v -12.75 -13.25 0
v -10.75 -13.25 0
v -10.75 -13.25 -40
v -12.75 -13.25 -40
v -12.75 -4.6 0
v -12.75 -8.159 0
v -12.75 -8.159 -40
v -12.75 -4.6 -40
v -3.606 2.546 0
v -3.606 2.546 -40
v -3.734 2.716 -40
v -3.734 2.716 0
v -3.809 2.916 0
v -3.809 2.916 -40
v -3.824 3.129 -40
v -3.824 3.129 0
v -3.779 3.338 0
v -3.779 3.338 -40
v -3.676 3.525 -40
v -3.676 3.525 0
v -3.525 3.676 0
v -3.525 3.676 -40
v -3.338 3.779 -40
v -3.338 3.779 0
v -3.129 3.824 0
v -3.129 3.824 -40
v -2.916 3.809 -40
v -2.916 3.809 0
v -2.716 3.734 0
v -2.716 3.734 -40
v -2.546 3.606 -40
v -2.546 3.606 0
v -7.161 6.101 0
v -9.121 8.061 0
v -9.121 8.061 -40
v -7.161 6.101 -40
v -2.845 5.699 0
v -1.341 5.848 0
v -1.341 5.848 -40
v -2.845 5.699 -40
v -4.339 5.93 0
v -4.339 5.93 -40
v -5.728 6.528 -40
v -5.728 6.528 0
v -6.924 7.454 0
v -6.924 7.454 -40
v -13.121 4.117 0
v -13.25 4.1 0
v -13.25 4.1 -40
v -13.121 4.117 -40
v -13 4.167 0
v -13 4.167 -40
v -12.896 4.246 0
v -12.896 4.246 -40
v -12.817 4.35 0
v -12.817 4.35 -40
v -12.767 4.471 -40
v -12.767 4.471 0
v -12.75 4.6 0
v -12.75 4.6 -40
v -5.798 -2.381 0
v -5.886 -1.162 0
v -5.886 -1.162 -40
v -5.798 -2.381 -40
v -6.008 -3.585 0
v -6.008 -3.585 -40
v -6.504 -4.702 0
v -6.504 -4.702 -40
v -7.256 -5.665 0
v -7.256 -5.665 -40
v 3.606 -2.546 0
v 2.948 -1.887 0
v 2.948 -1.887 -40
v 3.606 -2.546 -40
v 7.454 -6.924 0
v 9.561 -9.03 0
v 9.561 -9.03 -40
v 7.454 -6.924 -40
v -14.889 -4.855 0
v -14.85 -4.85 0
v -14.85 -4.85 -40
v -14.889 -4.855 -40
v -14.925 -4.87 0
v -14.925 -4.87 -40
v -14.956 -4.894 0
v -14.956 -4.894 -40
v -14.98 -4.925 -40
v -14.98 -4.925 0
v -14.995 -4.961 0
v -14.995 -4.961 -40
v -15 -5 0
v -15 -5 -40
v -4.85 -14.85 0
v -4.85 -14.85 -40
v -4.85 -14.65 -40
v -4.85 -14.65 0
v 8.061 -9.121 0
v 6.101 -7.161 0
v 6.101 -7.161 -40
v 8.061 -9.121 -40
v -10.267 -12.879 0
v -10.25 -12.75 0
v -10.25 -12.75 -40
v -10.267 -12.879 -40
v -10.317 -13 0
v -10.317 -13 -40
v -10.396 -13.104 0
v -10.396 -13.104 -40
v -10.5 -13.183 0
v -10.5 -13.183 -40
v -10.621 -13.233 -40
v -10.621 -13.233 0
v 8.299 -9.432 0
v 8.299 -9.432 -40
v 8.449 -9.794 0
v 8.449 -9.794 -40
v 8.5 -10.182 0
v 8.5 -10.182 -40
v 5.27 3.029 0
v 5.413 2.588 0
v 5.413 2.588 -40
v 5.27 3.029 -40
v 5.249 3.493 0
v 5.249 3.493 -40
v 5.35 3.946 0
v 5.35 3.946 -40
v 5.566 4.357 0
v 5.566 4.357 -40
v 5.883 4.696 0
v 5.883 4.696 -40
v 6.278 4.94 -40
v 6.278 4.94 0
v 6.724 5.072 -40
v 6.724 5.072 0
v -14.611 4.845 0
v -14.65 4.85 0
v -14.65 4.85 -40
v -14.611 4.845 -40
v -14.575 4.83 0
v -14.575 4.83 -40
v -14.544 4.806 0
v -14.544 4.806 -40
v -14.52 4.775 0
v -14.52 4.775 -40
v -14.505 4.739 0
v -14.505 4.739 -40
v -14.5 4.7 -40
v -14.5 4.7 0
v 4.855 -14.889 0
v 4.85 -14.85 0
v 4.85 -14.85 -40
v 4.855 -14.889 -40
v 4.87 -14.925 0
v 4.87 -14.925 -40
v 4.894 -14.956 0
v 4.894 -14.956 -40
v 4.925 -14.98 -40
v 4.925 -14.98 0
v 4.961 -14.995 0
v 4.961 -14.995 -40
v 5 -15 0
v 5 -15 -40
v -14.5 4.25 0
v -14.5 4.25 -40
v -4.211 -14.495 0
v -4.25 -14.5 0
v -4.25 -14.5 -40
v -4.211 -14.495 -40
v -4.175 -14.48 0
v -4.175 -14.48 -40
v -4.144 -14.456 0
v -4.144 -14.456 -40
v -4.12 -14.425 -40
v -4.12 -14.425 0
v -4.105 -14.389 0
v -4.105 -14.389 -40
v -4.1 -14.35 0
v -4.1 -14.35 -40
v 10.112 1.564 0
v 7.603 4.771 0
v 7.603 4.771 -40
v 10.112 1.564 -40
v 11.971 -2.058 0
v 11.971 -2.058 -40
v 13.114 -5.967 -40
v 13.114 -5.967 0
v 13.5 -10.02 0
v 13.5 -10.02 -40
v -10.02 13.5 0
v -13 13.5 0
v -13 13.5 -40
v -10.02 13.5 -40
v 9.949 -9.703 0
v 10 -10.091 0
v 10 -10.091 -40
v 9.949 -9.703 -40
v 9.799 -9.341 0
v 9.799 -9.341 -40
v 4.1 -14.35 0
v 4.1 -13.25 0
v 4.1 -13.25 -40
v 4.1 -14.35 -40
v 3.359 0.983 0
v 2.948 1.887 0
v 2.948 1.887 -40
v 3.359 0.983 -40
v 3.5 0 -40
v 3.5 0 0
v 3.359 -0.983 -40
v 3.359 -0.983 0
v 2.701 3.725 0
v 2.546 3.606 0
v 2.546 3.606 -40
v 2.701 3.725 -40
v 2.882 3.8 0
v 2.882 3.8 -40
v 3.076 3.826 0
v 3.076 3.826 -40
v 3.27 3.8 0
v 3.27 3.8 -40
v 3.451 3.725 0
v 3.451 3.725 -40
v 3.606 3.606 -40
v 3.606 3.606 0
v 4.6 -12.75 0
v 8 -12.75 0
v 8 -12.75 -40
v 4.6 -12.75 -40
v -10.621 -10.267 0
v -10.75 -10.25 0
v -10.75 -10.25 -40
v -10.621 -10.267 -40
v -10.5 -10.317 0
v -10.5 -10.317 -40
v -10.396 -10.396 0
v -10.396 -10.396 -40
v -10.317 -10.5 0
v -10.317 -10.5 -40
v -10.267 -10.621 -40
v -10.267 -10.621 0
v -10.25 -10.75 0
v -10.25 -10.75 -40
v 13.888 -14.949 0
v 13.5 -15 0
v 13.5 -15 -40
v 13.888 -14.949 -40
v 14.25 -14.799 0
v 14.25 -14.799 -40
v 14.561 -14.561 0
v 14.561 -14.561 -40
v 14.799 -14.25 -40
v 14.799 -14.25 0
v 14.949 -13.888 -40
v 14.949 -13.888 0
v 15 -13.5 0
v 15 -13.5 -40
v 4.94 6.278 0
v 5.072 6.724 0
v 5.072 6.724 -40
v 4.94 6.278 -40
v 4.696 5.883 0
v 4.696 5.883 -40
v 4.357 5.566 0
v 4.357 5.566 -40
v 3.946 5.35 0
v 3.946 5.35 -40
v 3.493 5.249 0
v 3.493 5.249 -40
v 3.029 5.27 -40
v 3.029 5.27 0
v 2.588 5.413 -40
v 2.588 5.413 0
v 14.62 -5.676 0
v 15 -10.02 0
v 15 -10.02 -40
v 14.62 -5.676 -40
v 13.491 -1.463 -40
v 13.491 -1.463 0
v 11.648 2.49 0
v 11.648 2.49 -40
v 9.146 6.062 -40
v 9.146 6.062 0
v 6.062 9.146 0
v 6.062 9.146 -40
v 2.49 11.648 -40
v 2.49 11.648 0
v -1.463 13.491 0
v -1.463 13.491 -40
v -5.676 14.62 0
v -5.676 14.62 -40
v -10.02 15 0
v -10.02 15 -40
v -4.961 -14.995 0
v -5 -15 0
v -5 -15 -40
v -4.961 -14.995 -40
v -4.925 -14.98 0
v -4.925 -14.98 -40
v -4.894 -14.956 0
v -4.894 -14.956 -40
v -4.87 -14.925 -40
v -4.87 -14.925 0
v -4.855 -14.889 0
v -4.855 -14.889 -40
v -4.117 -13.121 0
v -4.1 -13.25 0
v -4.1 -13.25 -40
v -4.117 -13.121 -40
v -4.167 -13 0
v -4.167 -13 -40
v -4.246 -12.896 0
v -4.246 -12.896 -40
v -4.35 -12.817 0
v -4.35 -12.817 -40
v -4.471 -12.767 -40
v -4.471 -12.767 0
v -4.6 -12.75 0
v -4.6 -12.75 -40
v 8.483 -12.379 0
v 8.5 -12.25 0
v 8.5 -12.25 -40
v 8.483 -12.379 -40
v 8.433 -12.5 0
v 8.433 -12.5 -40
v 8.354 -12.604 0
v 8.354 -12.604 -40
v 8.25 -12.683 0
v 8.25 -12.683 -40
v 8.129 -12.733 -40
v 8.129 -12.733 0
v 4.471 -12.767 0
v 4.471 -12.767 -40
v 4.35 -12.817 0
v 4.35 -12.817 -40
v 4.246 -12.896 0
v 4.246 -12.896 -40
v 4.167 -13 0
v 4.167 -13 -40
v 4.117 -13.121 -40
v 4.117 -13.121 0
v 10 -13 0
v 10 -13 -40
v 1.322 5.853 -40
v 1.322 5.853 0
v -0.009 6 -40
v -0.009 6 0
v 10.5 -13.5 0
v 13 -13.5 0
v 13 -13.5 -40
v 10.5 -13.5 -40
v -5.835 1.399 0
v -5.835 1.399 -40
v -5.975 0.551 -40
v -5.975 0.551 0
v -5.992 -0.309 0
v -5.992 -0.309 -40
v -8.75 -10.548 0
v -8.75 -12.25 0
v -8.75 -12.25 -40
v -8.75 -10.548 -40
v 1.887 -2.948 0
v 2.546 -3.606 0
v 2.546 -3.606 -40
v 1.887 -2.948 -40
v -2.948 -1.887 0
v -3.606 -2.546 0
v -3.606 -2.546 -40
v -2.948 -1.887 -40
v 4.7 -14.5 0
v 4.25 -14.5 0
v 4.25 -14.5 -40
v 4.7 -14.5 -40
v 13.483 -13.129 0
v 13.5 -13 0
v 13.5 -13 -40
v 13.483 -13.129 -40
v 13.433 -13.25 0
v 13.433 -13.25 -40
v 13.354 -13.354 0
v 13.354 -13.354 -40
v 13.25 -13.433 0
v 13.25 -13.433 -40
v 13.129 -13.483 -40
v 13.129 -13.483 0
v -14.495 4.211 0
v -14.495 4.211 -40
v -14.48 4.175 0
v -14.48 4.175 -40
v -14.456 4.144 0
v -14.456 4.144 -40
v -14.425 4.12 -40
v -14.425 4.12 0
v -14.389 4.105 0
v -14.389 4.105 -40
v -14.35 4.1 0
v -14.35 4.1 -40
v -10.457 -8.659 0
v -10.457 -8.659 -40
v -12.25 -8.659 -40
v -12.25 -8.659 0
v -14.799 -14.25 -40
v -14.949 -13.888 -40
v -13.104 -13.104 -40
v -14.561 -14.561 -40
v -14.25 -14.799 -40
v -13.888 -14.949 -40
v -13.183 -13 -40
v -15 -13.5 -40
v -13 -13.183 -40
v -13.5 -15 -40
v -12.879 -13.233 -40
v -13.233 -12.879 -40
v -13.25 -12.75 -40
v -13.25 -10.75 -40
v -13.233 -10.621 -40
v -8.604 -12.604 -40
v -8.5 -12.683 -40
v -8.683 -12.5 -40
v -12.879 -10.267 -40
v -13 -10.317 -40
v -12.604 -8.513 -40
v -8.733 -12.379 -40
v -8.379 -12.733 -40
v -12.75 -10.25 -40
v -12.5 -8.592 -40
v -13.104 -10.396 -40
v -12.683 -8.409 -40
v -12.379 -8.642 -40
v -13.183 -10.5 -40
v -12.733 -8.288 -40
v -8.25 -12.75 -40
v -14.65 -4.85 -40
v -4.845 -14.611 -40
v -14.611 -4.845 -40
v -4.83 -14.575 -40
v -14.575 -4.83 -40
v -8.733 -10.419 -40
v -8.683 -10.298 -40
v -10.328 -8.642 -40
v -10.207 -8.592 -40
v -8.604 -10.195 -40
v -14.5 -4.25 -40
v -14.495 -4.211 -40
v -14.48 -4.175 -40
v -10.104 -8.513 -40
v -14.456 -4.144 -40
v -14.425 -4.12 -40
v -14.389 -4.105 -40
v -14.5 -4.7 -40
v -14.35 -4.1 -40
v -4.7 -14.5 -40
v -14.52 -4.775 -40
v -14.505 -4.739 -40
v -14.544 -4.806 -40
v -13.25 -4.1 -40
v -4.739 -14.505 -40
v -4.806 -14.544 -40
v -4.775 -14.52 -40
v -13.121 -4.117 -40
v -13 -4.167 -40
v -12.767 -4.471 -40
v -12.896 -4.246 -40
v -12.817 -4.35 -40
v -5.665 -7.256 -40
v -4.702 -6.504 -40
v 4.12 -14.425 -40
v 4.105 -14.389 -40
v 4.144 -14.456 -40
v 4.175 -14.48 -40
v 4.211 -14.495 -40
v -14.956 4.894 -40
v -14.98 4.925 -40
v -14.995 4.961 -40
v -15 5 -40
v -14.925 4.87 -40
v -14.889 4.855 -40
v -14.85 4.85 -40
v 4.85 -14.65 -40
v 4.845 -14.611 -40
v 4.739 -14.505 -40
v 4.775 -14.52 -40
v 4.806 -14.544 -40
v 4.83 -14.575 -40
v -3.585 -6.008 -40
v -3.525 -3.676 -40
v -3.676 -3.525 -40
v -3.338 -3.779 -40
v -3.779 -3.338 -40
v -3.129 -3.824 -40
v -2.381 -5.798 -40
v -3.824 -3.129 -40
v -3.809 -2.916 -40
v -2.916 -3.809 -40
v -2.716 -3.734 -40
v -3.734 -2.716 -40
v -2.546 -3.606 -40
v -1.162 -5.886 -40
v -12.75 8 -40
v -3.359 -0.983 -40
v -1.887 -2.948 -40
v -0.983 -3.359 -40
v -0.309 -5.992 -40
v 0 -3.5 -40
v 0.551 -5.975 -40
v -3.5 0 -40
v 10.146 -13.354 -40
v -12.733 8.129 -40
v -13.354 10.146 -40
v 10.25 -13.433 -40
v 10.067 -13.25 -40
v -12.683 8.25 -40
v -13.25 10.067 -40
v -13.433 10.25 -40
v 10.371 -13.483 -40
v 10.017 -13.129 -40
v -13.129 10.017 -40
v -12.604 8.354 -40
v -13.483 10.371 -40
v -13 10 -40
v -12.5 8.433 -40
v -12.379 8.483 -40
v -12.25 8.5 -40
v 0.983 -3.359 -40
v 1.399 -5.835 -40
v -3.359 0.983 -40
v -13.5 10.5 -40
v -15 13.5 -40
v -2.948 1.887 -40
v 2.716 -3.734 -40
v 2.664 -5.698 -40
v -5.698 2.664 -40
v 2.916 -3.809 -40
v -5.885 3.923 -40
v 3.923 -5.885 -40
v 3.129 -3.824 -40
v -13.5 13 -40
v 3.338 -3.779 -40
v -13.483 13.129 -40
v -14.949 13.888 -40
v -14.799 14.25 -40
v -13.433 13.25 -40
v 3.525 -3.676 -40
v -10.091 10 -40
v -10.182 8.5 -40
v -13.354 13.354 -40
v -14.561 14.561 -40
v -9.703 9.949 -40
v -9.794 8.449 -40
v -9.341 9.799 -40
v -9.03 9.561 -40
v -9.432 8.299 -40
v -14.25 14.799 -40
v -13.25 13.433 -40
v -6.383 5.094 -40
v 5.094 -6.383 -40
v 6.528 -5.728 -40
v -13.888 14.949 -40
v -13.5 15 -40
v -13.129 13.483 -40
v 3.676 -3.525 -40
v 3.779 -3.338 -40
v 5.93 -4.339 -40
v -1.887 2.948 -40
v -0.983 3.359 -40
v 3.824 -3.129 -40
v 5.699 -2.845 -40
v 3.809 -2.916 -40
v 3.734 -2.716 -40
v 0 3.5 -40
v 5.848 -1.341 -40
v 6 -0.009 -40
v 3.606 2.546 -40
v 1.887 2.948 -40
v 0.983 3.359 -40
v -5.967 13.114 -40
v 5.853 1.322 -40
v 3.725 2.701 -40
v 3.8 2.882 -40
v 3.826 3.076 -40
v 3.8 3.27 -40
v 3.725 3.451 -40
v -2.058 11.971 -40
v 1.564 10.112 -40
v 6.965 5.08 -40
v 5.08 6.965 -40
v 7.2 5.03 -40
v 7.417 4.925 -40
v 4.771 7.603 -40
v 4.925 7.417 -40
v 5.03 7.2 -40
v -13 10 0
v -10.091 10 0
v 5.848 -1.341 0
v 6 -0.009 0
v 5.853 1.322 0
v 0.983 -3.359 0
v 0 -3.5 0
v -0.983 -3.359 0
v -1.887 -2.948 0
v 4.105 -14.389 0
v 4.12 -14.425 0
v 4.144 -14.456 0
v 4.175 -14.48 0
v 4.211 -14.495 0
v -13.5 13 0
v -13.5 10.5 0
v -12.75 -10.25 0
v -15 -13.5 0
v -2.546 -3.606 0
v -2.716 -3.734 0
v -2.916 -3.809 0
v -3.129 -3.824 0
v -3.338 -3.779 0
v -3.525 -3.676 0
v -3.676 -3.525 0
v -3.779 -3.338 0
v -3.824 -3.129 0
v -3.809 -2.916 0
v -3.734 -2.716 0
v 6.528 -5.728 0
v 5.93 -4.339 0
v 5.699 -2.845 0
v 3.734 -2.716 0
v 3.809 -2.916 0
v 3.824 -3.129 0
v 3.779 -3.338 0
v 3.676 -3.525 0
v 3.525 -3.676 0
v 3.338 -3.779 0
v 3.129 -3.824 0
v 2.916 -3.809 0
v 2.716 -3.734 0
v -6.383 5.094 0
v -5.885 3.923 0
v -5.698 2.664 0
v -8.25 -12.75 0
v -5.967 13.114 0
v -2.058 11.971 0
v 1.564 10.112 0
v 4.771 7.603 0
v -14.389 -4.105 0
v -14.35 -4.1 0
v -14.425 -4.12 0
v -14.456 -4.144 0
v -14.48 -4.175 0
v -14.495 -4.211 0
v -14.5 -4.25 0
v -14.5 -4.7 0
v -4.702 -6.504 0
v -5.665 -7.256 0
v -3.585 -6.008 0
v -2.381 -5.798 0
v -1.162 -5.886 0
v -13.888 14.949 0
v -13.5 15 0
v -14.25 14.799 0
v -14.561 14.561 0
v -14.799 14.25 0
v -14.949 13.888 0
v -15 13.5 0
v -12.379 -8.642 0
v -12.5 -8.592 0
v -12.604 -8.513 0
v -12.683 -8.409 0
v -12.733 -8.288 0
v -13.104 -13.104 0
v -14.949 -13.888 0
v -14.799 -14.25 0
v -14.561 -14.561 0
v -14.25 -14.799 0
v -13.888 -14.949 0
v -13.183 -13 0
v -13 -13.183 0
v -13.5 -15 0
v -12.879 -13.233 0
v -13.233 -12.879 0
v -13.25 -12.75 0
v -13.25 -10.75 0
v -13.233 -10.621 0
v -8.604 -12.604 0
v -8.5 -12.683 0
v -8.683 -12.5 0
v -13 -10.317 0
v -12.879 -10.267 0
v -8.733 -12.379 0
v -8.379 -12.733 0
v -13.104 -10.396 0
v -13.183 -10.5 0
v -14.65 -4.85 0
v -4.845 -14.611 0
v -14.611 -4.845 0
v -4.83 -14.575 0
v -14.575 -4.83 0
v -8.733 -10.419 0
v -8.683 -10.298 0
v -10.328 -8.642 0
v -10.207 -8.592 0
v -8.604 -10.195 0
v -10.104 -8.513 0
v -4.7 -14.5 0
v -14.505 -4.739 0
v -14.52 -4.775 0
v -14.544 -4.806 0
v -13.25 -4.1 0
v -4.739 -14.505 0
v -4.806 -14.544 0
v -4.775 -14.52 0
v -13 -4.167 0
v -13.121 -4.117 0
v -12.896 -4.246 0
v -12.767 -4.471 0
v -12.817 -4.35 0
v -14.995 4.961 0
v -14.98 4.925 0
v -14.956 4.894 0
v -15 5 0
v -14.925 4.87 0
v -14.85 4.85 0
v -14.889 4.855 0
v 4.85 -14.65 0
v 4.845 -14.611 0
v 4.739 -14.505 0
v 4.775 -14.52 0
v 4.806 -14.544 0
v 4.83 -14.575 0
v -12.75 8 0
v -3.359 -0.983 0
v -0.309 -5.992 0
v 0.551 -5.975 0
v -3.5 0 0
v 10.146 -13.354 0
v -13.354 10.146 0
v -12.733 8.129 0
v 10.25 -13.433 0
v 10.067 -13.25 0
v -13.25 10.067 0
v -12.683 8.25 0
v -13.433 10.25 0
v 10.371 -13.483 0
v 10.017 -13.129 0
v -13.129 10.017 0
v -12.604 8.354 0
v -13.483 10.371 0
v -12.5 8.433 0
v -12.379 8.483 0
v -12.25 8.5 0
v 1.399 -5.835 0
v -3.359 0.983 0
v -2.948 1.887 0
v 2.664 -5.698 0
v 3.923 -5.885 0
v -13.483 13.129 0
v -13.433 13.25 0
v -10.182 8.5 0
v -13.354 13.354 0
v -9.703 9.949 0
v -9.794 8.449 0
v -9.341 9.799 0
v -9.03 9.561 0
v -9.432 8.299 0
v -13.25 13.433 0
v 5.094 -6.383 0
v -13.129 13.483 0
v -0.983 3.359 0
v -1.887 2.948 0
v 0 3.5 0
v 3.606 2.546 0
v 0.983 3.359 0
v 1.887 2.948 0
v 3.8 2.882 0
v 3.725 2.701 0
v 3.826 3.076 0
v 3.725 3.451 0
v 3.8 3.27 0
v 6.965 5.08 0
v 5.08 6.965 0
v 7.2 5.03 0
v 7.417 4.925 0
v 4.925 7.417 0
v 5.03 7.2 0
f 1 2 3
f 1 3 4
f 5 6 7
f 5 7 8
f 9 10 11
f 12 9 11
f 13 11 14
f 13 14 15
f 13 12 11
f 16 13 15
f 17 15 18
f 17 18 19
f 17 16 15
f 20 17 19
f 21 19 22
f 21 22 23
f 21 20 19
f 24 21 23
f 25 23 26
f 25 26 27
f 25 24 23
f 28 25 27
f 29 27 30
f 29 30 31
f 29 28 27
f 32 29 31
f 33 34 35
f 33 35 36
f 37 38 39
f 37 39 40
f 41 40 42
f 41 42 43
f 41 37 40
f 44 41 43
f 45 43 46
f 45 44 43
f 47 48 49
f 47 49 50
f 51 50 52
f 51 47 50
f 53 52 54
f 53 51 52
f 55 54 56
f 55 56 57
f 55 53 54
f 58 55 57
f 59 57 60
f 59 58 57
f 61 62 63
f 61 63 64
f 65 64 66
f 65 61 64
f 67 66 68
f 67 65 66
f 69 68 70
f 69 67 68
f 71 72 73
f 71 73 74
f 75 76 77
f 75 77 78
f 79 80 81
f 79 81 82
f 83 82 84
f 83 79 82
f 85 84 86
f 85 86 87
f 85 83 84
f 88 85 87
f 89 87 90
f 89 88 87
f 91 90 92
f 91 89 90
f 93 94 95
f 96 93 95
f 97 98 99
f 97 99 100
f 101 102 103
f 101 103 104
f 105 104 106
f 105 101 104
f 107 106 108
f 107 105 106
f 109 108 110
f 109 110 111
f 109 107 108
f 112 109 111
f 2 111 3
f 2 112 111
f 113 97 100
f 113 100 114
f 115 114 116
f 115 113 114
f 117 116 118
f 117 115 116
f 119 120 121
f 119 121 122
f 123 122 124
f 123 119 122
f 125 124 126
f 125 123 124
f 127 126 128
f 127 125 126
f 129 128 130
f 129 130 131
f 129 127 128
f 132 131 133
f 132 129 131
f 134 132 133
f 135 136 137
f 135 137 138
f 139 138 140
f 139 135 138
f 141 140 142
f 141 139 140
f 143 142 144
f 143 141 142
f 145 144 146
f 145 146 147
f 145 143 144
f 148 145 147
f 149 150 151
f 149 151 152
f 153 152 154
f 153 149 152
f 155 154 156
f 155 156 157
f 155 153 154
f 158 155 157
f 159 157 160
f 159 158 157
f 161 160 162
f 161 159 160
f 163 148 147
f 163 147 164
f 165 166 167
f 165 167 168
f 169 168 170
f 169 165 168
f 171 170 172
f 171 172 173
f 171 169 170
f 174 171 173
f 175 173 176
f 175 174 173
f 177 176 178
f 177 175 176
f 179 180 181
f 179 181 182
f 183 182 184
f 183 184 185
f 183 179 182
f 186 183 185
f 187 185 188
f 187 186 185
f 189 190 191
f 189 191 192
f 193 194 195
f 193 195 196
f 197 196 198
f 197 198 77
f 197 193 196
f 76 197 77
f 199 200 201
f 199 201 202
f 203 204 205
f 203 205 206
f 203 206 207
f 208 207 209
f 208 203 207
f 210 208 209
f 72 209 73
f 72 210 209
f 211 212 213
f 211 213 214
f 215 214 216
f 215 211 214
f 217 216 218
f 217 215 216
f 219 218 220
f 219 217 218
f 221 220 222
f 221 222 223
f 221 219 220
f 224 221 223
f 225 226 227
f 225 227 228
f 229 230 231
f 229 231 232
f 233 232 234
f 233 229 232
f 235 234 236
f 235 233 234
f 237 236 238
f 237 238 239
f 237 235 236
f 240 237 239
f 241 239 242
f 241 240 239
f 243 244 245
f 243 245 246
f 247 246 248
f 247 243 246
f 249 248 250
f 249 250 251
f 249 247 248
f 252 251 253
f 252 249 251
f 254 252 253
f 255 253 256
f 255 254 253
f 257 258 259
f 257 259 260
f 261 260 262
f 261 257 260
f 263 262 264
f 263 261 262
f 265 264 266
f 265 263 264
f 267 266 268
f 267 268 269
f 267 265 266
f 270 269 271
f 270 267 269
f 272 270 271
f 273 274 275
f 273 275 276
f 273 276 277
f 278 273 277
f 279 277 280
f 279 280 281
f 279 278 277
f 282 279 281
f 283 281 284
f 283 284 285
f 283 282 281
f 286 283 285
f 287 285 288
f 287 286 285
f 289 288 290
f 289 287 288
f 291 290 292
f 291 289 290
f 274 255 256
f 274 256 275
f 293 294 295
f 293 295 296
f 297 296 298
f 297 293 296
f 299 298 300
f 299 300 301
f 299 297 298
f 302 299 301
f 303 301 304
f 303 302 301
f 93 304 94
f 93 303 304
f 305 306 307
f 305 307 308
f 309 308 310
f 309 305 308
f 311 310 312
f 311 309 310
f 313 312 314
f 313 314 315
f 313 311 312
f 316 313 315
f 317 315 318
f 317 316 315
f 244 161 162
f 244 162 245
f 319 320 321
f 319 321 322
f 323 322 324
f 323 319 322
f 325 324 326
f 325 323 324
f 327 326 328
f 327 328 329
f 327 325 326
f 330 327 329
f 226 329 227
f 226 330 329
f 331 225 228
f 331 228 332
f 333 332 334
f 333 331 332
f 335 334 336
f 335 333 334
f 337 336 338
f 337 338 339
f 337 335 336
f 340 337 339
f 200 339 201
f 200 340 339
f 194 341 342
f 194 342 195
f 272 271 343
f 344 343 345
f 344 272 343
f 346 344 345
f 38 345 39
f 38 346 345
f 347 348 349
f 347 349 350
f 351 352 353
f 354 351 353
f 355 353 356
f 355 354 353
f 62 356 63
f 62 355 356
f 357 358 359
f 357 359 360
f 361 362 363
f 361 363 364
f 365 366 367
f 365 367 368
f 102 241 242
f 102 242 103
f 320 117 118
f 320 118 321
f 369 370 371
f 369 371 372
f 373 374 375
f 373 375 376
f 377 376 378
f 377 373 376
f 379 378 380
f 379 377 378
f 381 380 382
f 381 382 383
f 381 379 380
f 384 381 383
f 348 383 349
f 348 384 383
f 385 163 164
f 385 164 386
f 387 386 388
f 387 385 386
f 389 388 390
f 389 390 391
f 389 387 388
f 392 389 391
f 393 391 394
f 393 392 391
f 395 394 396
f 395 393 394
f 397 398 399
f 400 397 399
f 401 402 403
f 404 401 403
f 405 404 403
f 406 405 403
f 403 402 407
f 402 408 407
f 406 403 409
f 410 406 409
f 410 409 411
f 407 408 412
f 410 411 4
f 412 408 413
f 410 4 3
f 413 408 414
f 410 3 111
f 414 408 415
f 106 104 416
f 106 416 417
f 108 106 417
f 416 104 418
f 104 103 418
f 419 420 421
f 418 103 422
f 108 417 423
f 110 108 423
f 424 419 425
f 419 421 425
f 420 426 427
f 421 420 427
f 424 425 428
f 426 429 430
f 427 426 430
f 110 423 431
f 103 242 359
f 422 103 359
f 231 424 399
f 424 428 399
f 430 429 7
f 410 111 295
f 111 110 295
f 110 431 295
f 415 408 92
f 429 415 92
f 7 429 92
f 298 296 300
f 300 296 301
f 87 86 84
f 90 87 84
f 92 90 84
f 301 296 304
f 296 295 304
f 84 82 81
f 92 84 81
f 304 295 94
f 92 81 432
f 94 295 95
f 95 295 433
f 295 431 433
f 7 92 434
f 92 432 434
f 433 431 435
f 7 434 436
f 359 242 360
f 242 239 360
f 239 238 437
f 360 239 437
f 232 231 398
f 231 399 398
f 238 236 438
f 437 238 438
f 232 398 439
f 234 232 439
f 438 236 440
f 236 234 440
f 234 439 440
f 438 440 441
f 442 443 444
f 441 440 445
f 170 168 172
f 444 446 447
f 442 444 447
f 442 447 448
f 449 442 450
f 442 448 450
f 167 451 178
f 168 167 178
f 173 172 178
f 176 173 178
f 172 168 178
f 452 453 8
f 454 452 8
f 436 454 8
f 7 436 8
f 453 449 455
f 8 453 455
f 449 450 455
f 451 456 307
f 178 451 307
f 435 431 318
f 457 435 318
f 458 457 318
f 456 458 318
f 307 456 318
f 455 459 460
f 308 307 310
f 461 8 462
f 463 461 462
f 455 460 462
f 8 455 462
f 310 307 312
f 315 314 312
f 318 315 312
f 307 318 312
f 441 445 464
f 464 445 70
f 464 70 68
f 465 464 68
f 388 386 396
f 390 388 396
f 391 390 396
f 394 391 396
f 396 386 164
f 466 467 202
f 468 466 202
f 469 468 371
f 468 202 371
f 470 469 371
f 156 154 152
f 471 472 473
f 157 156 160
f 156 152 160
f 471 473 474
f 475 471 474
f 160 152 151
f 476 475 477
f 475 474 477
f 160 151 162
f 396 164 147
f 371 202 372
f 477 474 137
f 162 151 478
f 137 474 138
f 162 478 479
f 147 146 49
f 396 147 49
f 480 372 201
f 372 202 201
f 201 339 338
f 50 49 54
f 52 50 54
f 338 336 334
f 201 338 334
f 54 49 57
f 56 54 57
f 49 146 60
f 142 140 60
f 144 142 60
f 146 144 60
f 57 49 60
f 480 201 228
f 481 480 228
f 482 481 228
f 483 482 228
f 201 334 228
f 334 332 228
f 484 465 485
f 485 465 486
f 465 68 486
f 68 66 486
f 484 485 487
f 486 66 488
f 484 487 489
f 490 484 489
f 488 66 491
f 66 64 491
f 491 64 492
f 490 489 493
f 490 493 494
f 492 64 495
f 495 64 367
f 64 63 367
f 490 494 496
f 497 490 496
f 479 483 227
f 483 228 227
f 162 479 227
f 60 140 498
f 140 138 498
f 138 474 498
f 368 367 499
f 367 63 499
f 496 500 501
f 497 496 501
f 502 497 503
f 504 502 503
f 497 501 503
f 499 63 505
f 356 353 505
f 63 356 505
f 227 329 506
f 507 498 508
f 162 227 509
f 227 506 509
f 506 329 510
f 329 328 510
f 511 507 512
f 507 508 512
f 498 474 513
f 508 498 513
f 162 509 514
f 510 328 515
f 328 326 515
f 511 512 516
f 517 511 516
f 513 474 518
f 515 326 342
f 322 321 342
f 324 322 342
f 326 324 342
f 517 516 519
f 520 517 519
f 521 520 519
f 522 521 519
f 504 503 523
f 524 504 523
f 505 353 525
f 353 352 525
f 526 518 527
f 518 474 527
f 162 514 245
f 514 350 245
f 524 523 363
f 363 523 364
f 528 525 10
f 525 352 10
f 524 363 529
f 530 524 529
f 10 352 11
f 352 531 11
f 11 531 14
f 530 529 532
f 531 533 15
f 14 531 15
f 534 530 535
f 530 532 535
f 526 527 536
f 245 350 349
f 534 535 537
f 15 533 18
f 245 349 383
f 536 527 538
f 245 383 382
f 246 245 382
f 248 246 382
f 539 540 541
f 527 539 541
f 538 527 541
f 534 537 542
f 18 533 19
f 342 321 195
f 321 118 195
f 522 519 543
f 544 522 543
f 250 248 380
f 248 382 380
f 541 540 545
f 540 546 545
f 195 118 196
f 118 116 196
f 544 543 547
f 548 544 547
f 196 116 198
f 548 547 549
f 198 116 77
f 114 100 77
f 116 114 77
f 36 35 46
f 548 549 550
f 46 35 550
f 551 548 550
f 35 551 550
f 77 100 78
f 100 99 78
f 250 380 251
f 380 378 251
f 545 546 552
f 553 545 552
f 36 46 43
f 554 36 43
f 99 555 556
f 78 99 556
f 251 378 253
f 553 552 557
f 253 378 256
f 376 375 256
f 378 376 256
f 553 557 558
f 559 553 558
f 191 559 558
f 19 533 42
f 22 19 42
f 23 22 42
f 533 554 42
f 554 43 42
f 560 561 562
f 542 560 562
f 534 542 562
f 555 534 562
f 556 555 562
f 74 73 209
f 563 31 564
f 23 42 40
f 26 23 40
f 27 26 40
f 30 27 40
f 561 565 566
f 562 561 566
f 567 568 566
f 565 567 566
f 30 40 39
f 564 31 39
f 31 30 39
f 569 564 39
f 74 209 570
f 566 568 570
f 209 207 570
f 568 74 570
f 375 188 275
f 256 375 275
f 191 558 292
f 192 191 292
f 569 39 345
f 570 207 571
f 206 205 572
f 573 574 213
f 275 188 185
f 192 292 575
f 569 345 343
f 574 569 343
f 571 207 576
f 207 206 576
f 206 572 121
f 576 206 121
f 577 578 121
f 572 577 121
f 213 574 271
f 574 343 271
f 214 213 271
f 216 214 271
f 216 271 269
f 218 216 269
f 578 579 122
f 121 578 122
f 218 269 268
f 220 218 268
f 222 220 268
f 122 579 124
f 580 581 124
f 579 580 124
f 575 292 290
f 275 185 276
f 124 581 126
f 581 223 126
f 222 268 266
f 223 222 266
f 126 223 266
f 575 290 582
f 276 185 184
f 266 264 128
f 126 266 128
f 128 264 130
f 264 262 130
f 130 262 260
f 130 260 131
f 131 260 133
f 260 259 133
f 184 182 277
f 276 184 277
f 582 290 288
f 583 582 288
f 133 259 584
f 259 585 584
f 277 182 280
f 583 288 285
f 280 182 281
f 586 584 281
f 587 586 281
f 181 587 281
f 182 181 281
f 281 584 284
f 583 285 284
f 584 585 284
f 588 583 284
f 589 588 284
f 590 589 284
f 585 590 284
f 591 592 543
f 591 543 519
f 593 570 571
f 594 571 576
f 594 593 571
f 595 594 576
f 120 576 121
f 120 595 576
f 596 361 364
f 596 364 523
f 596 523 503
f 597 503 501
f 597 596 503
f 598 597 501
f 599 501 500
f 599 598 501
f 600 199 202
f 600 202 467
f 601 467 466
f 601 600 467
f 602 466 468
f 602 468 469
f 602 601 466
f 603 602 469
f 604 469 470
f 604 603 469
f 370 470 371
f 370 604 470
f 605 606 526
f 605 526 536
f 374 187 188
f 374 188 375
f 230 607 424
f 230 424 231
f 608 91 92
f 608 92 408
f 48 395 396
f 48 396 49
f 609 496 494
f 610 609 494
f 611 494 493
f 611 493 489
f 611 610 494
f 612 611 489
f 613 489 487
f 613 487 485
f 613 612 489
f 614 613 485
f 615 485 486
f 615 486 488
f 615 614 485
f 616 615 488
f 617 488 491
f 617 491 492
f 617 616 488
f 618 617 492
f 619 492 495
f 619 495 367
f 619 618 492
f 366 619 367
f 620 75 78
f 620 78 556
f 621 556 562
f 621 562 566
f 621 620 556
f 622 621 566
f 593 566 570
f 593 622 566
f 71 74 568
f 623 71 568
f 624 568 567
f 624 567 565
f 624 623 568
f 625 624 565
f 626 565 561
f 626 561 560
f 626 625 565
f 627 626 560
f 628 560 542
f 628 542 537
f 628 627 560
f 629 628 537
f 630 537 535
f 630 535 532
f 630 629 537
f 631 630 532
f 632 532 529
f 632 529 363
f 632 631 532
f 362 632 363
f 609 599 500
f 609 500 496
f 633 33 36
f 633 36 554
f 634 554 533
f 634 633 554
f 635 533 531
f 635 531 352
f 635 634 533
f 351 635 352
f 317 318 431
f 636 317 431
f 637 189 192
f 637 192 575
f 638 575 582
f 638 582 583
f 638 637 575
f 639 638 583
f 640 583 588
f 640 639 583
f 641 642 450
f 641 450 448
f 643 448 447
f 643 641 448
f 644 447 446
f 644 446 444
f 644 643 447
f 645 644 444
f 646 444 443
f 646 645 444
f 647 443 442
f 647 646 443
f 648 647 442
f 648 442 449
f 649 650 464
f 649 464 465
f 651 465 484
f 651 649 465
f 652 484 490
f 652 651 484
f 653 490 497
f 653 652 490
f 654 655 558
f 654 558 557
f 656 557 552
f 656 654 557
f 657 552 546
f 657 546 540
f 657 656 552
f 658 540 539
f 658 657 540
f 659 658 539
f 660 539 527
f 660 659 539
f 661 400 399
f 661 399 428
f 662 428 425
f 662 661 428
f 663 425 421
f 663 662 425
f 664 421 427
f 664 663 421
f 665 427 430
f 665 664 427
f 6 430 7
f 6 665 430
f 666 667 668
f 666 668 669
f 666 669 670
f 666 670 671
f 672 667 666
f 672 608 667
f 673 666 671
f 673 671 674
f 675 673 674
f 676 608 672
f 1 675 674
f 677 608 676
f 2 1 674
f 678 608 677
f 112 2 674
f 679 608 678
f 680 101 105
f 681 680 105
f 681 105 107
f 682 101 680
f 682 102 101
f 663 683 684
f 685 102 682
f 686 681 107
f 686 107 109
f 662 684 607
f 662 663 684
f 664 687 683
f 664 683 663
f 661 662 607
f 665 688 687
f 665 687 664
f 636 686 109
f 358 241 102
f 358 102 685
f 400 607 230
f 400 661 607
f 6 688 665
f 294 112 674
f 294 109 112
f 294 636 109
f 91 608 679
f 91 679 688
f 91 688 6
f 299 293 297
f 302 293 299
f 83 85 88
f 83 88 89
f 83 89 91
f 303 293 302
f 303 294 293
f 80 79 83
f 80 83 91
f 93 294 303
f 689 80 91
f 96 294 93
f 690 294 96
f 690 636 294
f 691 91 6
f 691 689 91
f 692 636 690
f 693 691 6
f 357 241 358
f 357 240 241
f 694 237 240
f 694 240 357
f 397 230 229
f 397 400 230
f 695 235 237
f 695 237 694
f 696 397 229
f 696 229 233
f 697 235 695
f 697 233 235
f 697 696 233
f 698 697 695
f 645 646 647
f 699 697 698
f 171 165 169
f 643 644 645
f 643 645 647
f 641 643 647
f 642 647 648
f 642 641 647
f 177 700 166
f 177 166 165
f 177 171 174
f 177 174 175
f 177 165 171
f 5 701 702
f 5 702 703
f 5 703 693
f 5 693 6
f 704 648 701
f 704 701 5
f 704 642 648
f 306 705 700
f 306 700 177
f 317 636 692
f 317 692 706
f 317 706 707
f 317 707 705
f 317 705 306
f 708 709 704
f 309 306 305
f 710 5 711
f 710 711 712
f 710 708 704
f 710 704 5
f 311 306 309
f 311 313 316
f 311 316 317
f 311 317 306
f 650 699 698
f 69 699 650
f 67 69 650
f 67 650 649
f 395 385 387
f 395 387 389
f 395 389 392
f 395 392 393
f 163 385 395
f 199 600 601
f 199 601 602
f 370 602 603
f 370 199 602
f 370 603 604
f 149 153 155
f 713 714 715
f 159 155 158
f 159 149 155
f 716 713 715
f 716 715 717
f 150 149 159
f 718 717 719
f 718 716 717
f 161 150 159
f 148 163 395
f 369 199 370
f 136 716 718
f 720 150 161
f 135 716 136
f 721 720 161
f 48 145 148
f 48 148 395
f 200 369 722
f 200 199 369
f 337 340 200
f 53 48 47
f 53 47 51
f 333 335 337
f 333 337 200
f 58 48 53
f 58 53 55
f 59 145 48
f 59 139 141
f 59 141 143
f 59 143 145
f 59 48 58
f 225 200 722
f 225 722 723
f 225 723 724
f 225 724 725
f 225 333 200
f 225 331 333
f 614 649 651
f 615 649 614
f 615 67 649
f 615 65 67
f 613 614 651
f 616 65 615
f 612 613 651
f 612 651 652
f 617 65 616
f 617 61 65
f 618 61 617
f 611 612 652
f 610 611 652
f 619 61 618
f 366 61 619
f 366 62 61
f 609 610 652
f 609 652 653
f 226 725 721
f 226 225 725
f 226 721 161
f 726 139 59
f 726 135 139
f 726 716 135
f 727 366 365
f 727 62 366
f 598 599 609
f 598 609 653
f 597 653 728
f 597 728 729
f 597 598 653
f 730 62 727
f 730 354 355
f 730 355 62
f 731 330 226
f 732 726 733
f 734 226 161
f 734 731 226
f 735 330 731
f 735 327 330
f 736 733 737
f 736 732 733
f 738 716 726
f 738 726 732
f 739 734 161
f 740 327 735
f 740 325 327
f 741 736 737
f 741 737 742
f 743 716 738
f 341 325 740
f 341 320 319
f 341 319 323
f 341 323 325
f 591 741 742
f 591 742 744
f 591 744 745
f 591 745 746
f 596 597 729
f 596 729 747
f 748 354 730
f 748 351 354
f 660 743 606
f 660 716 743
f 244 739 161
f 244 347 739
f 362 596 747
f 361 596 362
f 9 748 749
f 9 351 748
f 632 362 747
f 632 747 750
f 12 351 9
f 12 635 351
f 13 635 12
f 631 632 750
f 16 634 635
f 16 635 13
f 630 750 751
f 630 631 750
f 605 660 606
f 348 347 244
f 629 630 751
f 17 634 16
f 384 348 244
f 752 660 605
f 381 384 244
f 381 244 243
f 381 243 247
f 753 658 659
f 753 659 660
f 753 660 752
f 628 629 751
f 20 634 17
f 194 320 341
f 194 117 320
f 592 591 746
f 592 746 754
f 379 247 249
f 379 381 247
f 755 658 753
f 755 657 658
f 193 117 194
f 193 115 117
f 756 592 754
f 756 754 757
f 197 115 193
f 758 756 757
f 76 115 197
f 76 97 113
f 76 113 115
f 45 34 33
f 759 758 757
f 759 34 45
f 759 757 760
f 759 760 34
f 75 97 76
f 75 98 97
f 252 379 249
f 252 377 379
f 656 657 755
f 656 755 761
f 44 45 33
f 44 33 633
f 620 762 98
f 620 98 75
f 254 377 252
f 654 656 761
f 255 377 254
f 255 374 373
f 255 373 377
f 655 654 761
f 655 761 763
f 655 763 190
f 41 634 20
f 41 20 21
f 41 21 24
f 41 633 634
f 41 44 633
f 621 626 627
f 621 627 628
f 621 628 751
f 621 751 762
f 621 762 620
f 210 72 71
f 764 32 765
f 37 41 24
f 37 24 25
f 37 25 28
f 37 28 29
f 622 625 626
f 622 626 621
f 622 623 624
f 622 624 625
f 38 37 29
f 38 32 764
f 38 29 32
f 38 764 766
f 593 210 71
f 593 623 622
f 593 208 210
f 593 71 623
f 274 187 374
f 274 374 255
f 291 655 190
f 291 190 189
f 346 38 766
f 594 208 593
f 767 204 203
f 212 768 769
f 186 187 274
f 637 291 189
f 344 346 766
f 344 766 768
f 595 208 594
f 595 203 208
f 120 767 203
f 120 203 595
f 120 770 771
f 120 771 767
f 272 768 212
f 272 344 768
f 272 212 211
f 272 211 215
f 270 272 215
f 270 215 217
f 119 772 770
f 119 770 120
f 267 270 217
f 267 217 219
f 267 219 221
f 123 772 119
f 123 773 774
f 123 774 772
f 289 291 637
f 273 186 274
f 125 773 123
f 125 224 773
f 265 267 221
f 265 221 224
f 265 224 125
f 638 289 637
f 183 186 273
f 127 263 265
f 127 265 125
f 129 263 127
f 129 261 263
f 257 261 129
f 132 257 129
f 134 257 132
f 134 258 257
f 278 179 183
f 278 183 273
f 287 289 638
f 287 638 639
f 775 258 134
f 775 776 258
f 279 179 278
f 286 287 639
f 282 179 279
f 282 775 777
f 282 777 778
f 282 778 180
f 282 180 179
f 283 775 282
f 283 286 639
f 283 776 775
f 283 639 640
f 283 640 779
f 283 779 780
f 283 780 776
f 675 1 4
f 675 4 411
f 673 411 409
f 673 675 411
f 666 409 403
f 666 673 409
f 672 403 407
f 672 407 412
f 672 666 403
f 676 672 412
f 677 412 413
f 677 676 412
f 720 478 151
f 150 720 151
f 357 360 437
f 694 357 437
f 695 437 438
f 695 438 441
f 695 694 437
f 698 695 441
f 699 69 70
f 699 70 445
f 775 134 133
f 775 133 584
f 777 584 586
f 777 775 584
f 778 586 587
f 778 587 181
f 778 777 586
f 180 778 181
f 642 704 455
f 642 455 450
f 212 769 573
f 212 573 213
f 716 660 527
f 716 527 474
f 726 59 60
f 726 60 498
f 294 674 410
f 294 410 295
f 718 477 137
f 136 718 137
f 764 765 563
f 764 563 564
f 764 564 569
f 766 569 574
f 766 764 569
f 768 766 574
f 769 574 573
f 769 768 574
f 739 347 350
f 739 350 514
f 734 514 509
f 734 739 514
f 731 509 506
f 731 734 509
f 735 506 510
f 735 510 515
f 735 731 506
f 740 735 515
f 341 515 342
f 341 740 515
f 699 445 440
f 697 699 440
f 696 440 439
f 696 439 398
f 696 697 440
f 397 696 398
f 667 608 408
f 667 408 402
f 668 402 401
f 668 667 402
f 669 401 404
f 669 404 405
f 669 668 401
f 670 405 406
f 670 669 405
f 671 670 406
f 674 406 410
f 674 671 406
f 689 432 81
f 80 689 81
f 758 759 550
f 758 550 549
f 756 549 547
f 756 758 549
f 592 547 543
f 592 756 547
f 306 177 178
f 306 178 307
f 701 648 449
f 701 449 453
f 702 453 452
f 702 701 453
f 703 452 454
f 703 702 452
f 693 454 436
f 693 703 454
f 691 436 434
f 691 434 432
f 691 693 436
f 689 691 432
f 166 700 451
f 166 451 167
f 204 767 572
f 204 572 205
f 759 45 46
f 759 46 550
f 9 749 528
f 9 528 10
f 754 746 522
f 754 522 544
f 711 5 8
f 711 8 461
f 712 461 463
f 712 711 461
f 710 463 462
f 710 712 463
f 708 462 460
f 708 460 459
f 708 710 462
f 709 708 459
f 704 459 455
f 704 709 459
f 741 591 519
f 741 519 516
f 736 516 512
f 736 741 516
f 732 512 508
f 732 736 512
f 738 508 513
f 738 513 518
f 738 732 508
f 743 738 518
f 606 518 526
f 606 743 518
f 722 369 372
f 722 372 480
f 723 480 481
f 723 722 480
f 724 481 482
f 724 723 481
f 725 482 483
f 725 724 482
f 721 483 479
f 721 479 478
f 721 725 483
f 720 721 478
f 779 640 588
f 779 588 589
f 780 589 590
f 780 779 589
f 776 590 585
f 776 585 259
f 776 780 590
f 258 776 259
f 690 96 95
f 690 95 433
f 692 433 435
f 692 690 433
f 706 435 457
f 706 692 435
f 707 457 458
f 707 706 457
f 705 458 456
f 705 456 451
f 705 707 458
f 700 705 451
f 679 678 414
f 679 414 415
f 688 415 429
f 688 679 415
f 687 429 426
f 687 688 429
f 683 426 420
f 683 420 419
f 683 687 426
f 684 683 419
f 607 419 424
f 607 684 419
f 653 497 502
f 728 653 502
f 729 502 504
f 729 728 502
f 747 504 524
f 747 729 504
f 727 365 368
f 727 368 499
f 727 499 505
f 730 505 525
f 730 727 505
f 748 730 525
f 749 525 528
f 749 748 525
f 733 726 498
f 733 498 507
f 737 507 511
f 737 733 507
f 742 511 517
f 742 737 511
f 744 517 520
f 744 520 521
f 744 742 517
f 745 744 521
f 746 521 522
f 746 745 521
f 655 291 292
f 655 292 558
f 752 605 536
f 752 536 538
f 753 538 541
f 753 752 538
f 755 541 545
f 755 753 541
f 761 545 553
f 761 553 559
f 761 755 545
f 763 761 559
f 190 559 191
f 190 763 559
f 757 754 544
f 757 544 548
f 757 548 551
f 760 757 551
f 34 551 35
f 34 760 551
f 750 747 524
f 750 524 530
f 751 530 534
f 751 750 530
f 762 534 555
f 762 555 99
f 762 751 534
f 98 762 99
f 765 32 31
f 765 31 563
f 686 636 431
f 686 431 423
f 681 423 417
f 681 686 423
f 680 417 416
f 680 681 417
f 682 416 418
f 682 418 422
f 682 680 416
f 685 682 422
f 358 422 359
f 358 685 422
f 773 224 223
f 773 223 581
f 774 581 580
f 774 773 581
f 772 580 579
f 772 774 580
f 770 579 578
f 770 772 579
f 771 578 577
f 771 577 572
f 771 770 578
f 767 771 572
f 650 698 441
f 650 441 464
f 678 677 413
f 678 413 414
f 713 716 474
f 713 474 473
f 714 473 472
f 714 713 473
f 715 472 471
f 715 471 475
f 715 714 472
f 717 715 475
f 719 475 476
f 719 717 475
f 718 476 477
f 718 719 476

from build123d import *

# Parameters (mm, degrees)
Y_KSEKLIK_EKSTR_ZYON2_DEPTH = 40


with BuildPart() as part:
    # Çizim1 → Yükseklik-Ekstrüzyon2 (new body)
    with BuildSketch(Plane.XY):
        with BuildLine():
            ThreePointArc((-12.75, -4.6), (-12.896446609, -4.246446609), (-13.25, -4.1))
            Line((-13.25, -4.1), (-14.35, -4.1))
            ThreePointArc((-14.35, -4.1), (-14.456066017, -4.143933983), (-14.5, -4.25))
            Line((-14.5, -4.25), (-14.5, -4.7))
            ThreePointArc((-14.5, -4.7), (-14.543933983, -4.806066017), (-14.65, -4.85))
            Line((-14.65, -4.85), (-14.85, -4.85))
            ThreePointArc((-14.85, -4.85), (-14.956066017, -4.893933983), (-15, -5))
            Line((-15, -5), (-15, -13.5))
            ThreePointArc((-15, -13.5), (-14.560660172, -14.560660172), (-13.5, -15))
            Line((-13.5, -15), (-5, -15))
            ThreePointArc((-5, -15), (-4.893933983, -14.956066017), (-4.85, -14.85))
            Line((-4.85, -14.85), (-4.85, -14.65))
            ThreePointArc((-4.85, -14.65), (-4.806066017, -14.543933983), (-4.7, -14.5))
            Line((-4.7, -14.5), (-4.25, -14.5))
            ThreePointArc((-4.25, -14.5), (-4.143933983, -14.456066017), (-4.1, -14.35))
            Line((-4.1, -14.35), (-4.1, -13.25))
            ThreePointArc((-4.1, -13.25), (-4.246446609, -12.896446609), (-4.6, -12.75))
            Line((-4.6, -12.75), (-8.25, -12.75))
            ThreePointArc((-8.25, -12.75), (-8.603553391, -12.603553391), (-8.75, -12.25))
            Line((-8.75, -12.25), (-8.75, -10.548097039))
            ThreePointArc((-8.75, -10.548097039), (-8.711939766, -10.356755323), (-8.603553391, -10.194543648))
            Line((-8.603553391, -10.194543648), (-5.665324285, -7.256314543))
            ThreePointArc((-5.665324285, -7.256314543), (-3.584805828, -6.008237883), (-1.161703843, -5.88646279))
            ThreePointArc((-1.161703843, -5.88646279), (0.121501595, -5.998769654), (1.399107062, -5.834595053))
            ThreePointArc((1.399107062, -5.834595053), (3.922877314, -5.884663497), (6.100563519, -7.161223691))
            Line((6.100563519, -7.161223691), (8.060660172, -9.121320344))
            ThreePointArc((8.060660172, -9.121320344), (8.385819299, -9.607955367), (8.5, -10.181980515))
            Line((8.5, -10.181980515), (8.5, -12.25))
            ThreePointArc((8.5, -12.25), (8.353553391, -12.603553391), (8, -12.75))
            Line((8, -12.75), (4.6, -12.75))
            ThreePointArc((4.6, -12.75), (4.246446609, -12.896446609), (4.1, -13.25))
            Line((4.1, -13.25), (4.1, -14.35))
            ThreePointArc((4.1, -14.35), (4.143933983, -14.456066017), (4.25, -14.5))
            Line((4.25, -14.5), (4.7, -14.5))
            ThreePointArc((4.7, -14.5), (4.806066017, -14.543933983), (4.85, -14.65))
            Line((4.85, -14.65), (4.85, -14.85))
            ThreePointArc((4.85, -14.85), (4.893933983, -14.956066017), (5, -15))
            Line((5, -15), (13.5, -15))
            ThreePointArc((13.5, -15), (14.560660172, -14.560660172), (15, -13.5))
            Line((15, -13.5), (15, -10.020449132))
            ThreePointArc((15, -10.020449132), (7.671680118, 7.671680118), (-10.020449132, 15))
            Line((-10.020449132, 15), (-13.5, 15))
            ThreePointArc((-13.5, 15), (-14.560660172, 14.560660172), (-15, 13.5))
            Line((-15, 13.5), (-15, 5))
            ThreePointArc((-15, 5), (-14.956066017, 4.893933983), (-14.85, 4.85))
            Line((-14.85, 4.85), (-14.65, 4.85))
            ThreePointArc((-14.65, 4.85), (-14.543933983, 4.806066017), (-14.5, 4.7))
            Line((-14.5, 4.7), (-14.5, 4.25))
            ThreePointArc((-14.5, 4.25), (-14.456066017, 4.143933983), (-14.35, 4.1))
            Line((-14.35, 4.1), (-13.25, 4.1))
            ThreePointArc((-13.25, 4.1), (-12.896446609, 4.246446609), (-12.75, 4.6))
            Line((-12.75, 4.6), (-12.75, 8))
            ThreePointArc((-12.75, 8), (-12.603553391, 8.353553391), (-12.25, 8.5))
            Line((-12.25, 8.5), (-10.181980515, 8.5))
            ThreePointArc((-10.181980515, 8.5), (-9.607955367, 8.385819299), (-9.121320344, 8.060660172))
            Line((-9.121320344, 8.060660172), (-7.161223691, 6.100563519))
            ThreePointArc((-7.161223691, 6.100563519), (-5.884663497, 3.922877314), (-5.834595053, 1.399107062))
            ThreePointArc((-5.834595053, 1.399107062), (-5.998769654, 0.121501595), (-5.88646279, -1.161703843))
            ThreePointArc((-5.88646279, -1.161703843), (-6.008237883, -3.584805828), (-7.256314543, -5.665324285))
            Line((-7.256314543, -5.665324285), (-10.103553391, -8.512563133))
            ThreePointArc((-10.103553391, -8.512563133), (-10.265765065, -8.620949509), (-10.457106781, -8.659009742))
            Line((-10.457106781, -8.659009742), (-12.25, -8.659009742))
            ThreePointArc((-12.25, -8.659009742), (-12.603553391, -8.512563133), (-12.75, -8.159009742))
            Line((-12.75, -8.159009742), (-12.75, -4.6))
        make_face()
        with BuildLine():
            ThreePointArc((2.587626892, 5.413334191), (0.660394354, 5.963545866), (-1.340526419, 5.848332149))
            ThreePointArc((-1.340526419, 5.848332149), (-4.339403848, 5.930394105), (-6.923693524, 7.45402361))
            Line((-6.923693524, 7.45402361), (-9.030330086, 9.560660172))
            ThreePointArc((-9.030330086, 9.560660172), (-9.516965109, 9.885819299), (-10.090990258, 10))
            Line((-10.090990258, 10), (-13, 10))
            ThreePointArc((-13, 10), (-13.353553391, 10.146446609), (-13.5, 10.5))
            Line((-13.5, 10.5), (-13.5, 13))
            ThreePointArc((-13.5, 13), (-13.353553391, 13.353553391), (-13, 13.5))
            Line((-13, 13.5), (-10.020449132, 13.5))
            ThreePointArc((-10.020449132, 13.5), (-2.058398163, 11.971373122), (4.771466284, 7.602859941))
            ThreePointArc((4.771466284, 7.602859941), (5.02983183, 7.200254947), (5.071628638, 6.723708451))
            ThreePointArc((5.071628638, 6.723708451), (4.158873557, 5.444388853), (2.587626892, 5.413334191))
        make_face(mode=Mode.SUBTRACT)
        with BuildLine():
            ThreePointArc((5.848332149, -1.340526419), (5.963545866, 0.660394354), (5.413334191, 2.587626892))
            ThreePointArc((5.413334191, 2.587626892), (5.444388853, 4.158873557), (6.723708451, 5.071628638))
            ThreePointArc((6.723708451, 5.071628638), (7.200254947, 5.02983183), (7.602859941, 4.771466284))
            ThreePointArc((7.602859941, 4.771466284), (11.971373122, -2.058398163), (13.5, -10.020449132))
            Line((13.5, -10.020449132), (13.5, -13))
            ThreePointArc((13.5, -13), (13.353553391, -13.353553391), (13, -13.5))
            Line((13, -13.5), (10.5, -13.5))
            ThreePointArc((10.5, -13.5), (10.146446609, -13.353553391), (10, -13))
            Line((10, -13), (10, -10.090990258))
            ThreePointArc((10, -10.090990258), (9.885819299, -9.516965109), (9.560660172, -9.030330086))
            Line((9.560660172, -9.030330086), (7.45402361, -6.923693524))
            ThreePointArc((7.45402361, -6.923693524), (5.930394105, -4.339403848), (5.848332149, -1.340526419))
        make_face(mode=Mode.SUBTRACT)
        with BuildLine():
            Line((-13.25, -12.75), (-13.25, -10.75))
            ThreePointArc((-13.25, -10.75), (-13.103553391, -10.396446609), (-12.75, -10.25))
            Line((-12.75, -10.25), (-10.75, -10.25))
            ThreePointArc((-10.75, -10.25), (-10.396446609, -10.396446609), (-10.25, -10.75))
            Line((-10.25, -10.75), (-10.25, -12.75))
            ThreePointArc((-10.25, -12.75), (-10.396446609, -13.103553391), (-10.75, -13.25))
            Line((-10.75, -13.25), (-12.75, -13.25))
            ThreePointArc((-12.75, -13.25), (-13.103553391, -13.103553391), (-13.25, -12.75))
        make_face(mode=Mode.SUBTRACT)
        with BuildLine():
            ThreePointArc((2.545584412, 3.606244584), (3.075914498, 3.825914498), (3.606244584, 3.606244584))
            ThreePointArc((3.606244584, 3.606244584), (3.825914498, 3.075914498), (3.606244584, 2.545584412))
            Line((3.606244584, 2.545584412), (2.947715037, 1.887054865))
            ThreePointArc((2.947715037, 1.887054865), (3.5, 0), (2.947715037, -1.887054865))
            Line((2.947715037, -1.887054865), (3.606244584, -2.545584412))
            ThreePointArc((3.606244584, -2.545584412), (3.606244584, -3.606244584), (2.545584412, -3.606244584))
            Line((2.545584412, -3.606244584), (1.887054865, -2.947715037))
            ThreePointArc((1.887054865, -2.947715037), (0, -3.5), (-1.887054865, -2.947715037))
            Line((-1.887054865, -2.947715037), (-2.545584412, -3.606244584))
            ThreePointArc((-2.545584412, -3.606244584), (-3.606244584, -3.606244584), (-3.606244584, -2.545584412))
            Line((-3.606244584, -2.545584412), (-2.947715037, -1.887054865))
            ThreePointArc((-2.947715037, -1.887054865), (-3.5, 0), (-2.947715037, 1.887054865))
            Line((-2.947715037, 1.887054865), (-3.606244584, 2.545584412))
            ThreePointArc((-3.606244584, 2.545584412), (-3.606244584, 3.606244584), (-2.545584412, 3.606244584))
            Line((-2.545584412, 3.606244584), (-1.887054865, 2.947715037))
            ThreePointArc((-1.887054865, 2.947715037), (0, 3.5), (1.887054865, 2.947715037))
            Line((1.887054865, 2.947715037), (2.545584412, 3.606244584))
        make_face(mode=Mode.SUBTRACT)
    extrude(amount=-Y_KSEKLIK_EKSTR_ZYON2_DEPTH)


solid = part.part
